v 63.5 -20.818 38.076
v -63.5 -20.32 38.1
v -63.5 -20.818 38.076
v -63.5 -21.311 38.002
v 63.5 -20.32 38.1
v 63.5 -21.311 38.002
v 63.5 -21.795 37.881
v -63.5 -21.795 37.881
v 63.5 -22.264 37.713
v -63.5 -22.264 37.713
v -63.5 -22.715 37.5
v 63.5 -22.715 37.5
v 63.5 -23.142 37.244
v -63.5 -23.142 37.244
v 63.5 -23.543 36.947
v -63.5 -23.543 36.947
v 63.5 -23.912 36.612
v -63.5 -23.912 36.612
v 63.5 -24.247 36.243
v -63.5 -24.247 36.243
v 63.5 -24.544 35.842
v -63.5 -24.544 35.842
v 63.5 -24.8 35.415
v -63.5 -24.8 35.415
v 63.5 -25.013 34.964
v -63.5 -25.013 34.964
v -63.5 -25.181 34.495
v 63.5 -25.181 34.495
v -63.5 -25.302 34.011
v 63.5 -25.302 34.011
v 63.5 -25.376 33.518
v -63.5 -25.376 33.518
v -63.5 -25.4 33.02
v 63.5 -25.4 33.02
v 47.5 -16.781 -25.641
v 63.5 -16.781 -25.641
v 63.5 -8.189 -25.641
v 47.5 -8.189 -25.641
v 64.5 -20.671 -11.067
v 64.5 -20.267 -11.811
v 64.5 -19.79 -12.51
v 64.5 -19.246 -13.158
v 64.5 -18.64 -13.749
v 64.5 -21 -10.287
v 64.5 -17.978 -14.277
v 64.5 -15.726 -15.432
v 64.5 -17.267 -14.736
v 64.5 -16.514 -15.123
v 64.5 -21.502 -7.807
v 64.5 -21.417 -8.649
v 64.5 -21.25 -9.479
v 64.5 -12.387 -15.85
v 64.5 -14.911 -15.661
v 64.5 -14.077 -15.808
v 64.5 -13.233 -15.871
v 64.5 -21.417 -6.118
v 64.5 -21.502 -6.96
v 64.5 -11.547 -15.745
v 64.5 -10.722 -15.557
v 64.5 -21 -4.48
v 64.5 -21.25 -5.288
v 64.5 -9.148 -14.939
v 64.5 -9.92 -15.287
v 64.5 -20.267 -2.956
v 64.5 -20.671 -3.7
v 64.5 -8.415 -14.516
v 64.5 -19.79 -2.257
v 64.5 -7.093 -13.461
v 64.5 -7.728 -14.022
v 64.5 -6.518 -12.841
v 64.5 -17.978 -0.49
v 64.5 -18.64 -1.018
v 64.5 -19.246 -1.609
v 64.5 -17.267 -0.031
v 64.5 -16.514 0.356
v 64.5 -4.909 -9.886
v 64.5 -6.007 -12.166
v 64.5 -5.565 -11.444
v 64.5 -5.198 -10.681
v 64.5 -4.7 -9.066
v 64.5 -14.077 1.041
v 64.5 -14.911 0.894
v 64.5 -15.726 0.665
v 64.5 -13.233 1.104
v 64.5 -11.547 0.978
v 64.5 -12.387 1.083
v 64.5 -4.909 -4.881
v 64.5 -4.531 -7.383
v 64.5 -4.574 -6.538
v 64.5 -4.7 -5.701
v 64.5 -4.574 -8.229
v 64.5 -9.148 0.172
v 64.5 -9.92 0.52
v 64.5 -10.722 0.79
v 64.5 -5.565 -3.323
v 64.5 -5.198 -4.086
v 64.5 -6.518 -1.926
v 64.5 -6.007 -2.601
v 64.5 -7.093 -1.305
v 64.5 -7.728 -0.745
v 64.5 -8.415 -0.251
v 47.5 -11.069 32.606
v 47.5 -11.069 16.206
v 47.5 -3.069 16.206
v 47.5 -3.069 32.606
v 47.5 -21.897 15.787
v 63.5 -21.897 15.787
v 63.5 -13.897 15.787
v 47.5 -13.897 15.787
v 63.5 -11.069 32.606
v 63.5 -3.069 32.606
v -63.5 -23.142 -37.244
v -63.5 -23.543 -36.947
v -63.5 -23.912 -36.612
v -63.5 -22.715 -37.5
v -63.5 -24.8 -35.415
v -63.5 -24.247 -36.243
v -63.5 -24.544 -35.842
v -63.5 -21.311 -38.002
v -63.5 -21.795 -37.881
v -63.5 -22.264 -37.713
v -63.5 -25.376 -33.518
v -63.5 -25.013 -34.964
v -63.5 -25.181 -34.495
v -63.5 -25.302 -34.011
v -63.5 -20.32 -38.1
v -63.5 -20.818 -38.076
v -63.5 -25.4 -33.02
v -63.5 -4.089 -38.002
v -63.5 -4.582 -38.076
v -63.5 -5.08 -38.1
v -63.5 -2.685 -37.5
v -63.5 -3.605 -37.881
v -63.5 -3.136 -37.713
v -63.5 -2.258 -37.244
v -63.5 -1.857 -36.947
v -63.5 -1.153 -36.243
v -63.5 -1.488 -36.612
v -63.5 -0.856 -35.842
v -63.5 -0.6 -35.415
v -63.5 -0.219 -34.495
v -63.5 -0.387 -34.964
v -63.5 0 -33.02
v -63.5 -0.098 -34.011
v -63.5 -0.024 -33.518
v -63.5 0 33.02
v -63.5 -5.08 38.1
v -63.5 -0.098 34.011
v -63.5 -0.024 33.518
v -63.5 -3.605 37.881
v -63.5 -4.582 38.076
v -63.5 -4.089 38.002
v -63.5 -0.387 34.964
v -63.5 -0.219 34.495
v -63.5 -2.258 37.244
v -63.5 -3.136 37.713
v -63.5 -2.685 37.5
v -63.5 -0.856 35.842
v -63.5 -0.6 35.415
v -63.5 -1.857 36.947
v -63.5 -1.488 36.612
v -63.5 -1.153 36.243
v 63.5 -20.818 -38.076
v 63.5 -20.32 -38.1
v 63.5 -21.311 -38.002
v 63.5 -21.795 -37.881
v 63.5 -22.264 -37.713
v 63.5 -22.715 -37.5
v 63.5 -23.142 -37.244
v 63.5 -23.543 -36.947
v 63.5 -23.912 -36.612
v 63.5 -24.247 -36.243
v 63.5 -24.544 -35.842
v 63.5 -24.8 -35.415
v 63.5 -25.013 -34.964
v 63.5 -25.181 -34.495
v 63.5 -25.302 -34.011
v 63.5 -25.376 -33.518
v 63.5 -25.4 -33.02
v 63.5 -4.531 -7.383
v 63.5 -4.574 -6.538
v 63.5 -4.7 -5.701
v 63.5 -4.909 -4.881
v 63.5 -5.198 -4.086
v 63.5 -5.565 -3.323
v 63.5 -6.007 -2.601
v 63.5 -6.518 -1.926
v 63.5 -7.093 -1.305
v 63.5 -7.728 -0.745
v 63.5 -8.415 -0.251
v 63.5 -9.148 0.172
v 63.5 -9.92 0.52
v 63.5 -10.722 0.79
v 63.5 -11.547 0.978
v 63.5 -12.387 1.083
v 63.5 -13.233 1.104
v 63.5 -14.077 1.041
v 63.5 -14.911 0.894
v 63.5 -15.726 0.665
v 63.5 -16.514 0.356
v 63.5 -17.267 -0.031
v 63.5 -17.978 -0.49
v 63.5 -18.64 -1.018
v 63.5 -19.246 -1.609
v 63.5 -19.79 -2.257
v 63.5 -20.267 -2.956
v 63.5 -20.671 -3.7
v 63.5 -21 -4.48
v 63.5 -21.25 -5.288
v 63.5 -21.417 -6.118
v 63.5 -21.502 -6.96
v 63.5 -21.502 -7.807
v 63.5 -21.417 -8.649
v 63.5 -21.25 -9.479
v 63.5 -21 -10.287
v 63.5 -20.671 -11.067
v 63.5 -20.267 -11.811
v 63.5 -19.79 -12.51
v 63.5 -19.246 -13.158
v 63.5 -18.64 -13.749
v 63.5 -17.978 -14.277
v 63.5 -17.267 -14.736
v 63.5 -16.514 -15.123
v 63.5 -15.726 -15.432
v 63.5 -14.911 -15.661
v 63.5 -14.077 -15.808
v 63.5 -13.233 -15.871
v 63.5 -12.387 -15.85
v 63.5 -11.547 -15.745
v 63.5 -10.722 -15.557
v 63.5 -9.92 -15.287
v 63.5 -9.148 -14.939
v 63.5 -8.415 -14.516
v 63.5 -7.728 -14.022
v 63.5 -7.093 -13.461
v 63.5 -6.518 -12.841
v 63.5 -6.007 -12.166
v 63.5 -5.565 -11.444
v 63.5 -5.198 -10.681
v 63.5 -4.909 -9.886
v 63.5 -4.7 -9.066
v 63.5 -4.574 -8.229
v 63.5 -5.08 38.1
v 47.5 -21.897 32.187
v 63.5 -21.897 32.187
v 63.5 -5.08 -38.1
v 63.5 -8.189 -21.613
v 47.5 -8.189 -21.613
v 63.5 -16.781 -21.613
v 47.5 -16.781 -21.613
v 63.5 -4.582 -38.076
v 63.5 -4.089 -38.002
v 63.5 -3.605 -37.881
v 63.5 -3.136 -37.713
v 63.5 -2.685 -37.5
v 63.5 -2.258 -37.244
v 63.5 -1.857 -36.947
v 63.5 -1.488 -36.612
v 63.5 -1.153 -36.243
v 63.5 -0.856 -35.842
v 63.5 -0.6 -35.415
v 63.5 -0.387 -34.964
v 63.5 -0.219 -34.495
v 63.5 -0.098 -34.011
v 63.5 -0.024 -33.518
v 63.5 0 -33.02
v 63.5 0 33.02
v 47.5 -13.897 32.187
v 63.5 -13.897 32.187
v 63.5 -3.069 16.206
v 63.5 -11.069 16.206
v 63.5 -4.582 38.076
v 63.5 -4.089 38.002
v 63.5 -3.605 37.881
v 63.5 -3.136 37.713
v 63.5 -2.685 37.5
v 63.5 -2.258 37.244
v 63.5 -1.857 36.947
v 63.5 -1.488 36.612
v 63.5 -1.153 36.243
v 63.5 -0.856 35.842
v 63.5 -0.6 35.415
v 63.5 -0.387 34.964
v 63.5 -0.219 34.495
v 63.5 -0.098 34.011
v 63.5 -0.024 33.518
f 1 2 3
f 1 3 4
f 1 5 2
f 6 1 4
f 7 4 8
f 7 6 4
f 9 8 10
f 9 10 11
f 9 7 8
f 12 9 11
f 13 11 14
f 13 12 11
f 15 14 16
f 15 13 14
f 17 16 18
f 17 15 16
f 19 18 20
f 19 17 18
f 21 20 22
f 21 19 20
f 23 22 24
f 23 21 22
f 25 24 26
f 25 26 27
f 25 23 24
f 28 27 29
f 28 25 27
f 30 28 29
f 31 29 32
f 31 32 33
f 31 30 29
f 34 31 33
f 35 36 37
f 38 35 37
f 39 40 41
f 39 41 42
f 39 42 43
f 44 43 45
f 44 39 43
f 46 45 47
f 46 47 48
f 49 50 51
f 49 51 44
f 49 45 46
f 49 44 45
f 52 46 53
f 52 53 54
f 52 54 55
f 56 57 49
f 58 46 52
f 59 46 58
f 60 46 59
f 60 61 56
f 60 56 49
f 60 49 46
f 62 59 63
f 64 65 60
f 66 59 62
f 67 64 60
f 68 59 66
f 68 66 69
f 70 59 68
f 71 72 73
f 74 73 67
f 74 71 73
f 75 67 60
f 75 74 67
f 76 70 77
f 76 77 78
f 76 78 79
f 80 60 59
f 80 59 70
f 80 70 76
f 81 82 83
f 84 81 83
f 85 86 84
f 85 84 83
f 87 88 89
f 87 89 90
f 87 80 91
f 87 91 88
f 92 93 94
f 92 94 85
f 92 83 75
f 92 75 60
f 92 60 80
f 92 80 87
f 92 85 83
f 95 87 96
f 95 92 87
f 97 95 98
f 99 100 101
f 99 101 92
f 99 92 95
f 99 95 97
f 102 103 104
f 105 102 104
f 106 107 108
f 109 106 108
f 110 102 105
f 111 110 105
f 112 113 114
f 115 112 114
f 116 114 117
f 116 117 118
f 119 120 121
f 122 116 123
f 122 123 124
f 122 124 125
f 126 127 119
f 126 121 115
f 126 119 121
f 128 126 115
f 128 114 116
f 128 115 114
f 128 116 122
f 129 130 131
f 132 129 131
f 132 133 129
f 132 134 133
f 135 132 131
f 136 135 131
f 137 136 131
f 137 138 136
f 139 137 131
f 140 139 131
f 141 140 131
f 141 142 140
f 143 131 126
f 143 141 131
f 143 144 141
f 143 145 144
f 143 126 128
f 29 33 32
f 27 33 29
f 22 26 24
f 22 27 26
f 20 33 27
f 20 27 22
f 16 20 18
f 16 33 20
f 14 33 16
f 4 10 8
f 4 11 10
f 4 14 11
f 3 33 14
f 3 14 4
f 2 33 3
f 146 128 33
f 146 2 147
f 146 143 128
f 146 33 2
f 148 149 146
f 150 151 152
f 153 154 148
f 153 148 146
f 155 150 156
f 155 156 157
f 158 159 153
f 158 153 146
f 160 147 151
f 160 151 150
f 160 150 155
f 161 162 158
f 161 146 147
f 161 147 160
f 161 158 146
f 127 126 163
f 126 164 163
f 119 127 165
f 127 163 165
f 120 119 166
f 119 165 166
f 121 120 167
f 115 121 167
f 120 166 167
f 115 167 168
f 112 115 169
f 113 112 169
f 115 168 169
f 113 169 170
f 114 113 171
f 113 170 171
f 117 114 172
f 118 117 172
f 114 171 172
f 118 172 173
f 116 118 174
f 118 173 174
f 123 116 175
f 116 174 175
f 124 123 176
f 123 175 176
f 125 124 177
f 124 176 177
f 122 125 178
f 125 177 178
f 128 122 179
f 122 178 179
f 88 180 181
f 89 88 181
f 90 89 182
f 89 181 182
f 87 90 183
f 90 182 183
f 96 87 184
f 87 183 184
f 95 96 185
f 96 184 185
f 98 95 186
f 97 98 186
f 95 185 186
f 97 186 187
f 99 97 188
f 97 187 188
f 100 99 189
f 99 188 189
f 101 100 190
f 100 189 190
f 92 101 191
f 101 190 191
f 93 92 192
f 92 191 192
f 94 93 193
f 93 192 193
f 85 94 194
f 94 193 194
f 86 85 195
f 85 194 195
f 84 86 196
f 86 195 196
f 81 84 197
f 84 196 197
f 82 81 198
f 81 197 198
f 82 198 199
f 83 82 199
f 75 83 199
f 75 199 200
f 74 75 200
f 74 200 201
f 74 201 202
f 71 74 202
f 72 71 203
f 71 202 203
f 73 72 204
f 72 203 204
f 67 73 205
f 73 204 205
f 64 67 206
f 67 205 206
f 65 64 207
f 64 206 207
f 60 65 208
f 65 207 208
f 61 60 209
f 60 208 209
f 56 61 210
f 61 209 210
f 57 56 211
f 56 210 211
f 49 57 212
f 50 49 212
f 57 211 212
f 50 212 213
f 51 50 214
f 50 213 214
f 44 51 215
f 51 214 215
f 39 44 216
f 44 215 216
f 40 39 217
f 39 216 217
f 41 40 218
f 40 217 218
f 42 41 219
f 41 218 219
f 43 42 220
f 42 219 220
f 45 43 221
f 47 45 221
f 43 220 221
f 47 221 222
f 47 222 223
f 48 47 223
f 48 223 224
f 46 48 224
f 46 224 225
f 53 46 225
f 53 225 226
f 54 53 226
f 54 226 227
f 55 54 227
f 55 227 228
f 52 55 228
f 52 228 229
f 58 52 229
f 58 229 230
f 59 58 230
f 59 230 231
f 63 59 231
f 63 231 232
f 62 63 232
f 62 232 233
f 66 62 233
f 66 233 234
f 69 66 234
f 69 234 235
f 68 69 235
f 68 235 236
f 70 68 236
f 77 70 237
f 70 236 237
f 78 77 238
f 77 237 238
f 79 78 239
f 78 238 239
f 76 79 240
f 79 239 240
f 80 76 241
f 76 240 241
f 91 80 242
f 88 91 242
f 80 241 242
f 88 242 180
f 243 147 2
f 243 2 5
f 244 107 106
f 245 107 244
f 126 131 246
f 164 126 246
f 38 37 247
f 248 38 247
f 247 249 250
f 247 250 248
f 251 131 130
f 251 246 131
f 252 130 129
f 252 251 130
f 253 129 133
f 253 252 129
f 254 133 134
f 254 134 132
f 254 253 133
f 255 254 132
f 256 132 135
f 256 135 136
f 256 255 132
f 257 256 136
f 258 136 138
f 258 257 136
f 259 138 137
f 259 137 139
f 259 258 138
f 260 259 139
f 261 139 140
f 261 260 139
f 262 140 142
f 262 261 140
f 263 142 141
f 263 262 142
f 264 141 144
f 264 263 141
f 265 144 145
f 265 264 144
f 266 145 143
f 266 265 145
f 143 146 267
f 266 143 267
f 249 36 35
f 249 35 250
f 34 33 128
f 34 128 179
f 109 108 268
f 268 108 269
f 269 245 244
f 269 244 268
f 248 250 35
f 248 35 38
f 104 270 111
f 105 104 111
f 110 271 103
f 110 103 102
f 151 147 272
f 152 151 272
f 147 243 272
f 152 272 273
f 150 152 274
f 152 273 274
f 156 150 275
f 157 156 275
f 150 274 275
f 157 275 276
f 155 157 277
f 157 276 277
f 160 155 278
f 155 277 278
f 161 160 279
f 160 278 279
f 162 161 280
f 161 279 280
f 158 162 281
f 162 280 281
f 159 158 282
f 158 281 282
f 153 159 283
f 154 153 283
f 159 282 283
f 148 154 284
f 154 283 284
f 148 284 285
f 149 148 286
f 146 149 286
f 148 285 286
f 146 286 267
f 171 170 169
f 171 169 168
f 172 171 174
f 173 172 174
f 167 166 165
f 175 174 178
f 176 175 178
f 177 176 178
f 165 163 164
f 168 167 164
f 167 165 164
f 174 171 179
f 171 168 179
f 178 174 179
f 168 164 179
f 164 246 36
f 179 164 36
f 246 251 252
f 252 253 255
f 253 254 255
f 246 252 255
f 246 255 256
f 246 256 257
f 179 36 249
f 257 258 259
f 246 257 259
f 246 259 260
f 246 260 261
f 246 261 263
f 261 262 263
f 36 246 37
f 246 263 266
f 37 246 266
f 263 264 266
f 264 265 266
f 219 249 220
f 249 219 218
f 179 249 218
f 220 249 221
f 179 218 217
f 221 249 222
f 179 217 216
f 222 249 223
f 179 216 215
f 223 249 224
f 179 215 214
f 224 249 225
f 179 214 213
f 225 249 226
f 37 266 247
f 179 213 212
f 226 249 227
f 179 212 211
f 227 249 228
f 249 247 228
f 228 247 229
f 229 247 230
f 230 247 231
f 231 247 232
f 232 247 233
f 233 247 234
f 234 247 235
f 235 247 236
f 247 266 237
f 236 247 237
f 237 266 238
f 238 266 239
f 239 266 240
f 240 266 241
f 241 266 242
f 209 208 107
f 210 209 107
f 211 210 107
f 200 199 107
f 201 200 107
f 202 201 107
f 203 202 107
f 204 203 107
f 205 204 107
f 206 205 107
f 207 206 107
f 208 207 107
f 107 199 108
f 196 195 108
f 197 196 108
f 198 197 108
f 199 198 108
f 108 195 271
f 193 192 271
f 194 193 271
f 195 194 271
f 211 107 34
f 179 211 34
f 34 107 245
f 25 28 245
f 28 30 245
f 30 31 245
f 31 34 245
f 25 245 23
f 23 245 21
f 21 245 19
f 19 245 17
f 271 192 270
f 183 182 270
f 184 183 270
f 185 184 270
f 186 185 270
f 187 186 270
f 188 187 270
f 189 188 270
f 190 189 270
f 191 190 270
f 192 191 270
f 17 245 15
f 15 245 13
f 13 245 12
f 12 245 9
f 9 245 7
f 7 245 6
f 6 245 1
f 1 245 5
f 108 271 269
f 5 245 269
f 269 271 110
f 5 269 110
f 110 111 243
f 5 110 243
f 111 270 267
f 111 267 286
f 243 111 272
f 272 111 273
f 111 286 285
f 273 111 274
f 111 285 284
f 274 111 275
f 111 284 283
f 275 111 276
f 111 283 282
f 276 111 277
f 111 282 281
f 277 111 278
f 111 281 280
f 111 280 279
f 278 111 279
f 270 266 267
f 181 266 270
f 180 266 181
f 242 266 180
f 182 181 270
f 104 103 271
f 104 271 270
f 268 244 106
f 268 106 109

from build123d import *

# Parameters (mm, degrees)
F0_W      = 127
F0_H      = 76.2
F1_DEPTH  = 25.4
F2_R      = 5.08
F4_W      = 8
F4_H      = 16.4
F5_DEPTH  = 16
F6_W      = 8
F6_H      = 16.4
F7_DEPTH  = 16
F8_R      = 8.490397
F9_DEPTH  = 1
F10_W     = 8.591677
F10_H     = 4.027348
F11_DEPTH = 16


with BuildPart() as f1:
    # F0 (on Front) → F1 (new body)
    with BuildSketch(Plane.XZ):
        Rectangle(F0_W, F0_H)
    extrude(amount=F1_DEPTH)

    # F2
    f2_edges = [f1.edges().sort_by_distance(p)[0] for p in [
        (0, -25.4, 38.1),
        (0, 0, 38.1),
        (0, 0, -38.1),
        (0, -25.4, -38.1),
    ]]
    fillet(f2_edges, radius=F2_R)

    # F4 (on face) → F5 (cut)
    with BuildSketch(Plane.YZ.offset(63.5)):
        with Locations((-17.896974, 23.987068)):
            Rectangle(F4_W, F4_H)
    extrude(amount=-F5_DEPTH, mode=Mode.SUBTRACT)

    # F6 (on face) → F7 (cut)
    with BuildSketch(Plane.YZ.offset(63.5)):
        with Locations((-7.068553, 24.406013)):
            Rectangle(F6_W, F6_H)
    extrude(amount=-F7_DEPTH, mode=Mode.SUBTRACT)

    # F8 (on face) → F9 (join)
    with BuildSketch(Plane.YZ.offset(63.5)):
        with Locations((-13.021762, -7.383473)):
            Circle(F8_R)
    extrude(amount=F9_DEPTH)

    # F10 (on face) → F11 (cut)
    with BuildSketch(Plane.YZ.offset(63.5)):
        with Locations((-12.484782, -23.627115)):
            Rectangle(F10_W, F10_H)
    extrude(amount=-F11_DEPTH, mode=Mode.SUBTRACT)


solid = f1.part
